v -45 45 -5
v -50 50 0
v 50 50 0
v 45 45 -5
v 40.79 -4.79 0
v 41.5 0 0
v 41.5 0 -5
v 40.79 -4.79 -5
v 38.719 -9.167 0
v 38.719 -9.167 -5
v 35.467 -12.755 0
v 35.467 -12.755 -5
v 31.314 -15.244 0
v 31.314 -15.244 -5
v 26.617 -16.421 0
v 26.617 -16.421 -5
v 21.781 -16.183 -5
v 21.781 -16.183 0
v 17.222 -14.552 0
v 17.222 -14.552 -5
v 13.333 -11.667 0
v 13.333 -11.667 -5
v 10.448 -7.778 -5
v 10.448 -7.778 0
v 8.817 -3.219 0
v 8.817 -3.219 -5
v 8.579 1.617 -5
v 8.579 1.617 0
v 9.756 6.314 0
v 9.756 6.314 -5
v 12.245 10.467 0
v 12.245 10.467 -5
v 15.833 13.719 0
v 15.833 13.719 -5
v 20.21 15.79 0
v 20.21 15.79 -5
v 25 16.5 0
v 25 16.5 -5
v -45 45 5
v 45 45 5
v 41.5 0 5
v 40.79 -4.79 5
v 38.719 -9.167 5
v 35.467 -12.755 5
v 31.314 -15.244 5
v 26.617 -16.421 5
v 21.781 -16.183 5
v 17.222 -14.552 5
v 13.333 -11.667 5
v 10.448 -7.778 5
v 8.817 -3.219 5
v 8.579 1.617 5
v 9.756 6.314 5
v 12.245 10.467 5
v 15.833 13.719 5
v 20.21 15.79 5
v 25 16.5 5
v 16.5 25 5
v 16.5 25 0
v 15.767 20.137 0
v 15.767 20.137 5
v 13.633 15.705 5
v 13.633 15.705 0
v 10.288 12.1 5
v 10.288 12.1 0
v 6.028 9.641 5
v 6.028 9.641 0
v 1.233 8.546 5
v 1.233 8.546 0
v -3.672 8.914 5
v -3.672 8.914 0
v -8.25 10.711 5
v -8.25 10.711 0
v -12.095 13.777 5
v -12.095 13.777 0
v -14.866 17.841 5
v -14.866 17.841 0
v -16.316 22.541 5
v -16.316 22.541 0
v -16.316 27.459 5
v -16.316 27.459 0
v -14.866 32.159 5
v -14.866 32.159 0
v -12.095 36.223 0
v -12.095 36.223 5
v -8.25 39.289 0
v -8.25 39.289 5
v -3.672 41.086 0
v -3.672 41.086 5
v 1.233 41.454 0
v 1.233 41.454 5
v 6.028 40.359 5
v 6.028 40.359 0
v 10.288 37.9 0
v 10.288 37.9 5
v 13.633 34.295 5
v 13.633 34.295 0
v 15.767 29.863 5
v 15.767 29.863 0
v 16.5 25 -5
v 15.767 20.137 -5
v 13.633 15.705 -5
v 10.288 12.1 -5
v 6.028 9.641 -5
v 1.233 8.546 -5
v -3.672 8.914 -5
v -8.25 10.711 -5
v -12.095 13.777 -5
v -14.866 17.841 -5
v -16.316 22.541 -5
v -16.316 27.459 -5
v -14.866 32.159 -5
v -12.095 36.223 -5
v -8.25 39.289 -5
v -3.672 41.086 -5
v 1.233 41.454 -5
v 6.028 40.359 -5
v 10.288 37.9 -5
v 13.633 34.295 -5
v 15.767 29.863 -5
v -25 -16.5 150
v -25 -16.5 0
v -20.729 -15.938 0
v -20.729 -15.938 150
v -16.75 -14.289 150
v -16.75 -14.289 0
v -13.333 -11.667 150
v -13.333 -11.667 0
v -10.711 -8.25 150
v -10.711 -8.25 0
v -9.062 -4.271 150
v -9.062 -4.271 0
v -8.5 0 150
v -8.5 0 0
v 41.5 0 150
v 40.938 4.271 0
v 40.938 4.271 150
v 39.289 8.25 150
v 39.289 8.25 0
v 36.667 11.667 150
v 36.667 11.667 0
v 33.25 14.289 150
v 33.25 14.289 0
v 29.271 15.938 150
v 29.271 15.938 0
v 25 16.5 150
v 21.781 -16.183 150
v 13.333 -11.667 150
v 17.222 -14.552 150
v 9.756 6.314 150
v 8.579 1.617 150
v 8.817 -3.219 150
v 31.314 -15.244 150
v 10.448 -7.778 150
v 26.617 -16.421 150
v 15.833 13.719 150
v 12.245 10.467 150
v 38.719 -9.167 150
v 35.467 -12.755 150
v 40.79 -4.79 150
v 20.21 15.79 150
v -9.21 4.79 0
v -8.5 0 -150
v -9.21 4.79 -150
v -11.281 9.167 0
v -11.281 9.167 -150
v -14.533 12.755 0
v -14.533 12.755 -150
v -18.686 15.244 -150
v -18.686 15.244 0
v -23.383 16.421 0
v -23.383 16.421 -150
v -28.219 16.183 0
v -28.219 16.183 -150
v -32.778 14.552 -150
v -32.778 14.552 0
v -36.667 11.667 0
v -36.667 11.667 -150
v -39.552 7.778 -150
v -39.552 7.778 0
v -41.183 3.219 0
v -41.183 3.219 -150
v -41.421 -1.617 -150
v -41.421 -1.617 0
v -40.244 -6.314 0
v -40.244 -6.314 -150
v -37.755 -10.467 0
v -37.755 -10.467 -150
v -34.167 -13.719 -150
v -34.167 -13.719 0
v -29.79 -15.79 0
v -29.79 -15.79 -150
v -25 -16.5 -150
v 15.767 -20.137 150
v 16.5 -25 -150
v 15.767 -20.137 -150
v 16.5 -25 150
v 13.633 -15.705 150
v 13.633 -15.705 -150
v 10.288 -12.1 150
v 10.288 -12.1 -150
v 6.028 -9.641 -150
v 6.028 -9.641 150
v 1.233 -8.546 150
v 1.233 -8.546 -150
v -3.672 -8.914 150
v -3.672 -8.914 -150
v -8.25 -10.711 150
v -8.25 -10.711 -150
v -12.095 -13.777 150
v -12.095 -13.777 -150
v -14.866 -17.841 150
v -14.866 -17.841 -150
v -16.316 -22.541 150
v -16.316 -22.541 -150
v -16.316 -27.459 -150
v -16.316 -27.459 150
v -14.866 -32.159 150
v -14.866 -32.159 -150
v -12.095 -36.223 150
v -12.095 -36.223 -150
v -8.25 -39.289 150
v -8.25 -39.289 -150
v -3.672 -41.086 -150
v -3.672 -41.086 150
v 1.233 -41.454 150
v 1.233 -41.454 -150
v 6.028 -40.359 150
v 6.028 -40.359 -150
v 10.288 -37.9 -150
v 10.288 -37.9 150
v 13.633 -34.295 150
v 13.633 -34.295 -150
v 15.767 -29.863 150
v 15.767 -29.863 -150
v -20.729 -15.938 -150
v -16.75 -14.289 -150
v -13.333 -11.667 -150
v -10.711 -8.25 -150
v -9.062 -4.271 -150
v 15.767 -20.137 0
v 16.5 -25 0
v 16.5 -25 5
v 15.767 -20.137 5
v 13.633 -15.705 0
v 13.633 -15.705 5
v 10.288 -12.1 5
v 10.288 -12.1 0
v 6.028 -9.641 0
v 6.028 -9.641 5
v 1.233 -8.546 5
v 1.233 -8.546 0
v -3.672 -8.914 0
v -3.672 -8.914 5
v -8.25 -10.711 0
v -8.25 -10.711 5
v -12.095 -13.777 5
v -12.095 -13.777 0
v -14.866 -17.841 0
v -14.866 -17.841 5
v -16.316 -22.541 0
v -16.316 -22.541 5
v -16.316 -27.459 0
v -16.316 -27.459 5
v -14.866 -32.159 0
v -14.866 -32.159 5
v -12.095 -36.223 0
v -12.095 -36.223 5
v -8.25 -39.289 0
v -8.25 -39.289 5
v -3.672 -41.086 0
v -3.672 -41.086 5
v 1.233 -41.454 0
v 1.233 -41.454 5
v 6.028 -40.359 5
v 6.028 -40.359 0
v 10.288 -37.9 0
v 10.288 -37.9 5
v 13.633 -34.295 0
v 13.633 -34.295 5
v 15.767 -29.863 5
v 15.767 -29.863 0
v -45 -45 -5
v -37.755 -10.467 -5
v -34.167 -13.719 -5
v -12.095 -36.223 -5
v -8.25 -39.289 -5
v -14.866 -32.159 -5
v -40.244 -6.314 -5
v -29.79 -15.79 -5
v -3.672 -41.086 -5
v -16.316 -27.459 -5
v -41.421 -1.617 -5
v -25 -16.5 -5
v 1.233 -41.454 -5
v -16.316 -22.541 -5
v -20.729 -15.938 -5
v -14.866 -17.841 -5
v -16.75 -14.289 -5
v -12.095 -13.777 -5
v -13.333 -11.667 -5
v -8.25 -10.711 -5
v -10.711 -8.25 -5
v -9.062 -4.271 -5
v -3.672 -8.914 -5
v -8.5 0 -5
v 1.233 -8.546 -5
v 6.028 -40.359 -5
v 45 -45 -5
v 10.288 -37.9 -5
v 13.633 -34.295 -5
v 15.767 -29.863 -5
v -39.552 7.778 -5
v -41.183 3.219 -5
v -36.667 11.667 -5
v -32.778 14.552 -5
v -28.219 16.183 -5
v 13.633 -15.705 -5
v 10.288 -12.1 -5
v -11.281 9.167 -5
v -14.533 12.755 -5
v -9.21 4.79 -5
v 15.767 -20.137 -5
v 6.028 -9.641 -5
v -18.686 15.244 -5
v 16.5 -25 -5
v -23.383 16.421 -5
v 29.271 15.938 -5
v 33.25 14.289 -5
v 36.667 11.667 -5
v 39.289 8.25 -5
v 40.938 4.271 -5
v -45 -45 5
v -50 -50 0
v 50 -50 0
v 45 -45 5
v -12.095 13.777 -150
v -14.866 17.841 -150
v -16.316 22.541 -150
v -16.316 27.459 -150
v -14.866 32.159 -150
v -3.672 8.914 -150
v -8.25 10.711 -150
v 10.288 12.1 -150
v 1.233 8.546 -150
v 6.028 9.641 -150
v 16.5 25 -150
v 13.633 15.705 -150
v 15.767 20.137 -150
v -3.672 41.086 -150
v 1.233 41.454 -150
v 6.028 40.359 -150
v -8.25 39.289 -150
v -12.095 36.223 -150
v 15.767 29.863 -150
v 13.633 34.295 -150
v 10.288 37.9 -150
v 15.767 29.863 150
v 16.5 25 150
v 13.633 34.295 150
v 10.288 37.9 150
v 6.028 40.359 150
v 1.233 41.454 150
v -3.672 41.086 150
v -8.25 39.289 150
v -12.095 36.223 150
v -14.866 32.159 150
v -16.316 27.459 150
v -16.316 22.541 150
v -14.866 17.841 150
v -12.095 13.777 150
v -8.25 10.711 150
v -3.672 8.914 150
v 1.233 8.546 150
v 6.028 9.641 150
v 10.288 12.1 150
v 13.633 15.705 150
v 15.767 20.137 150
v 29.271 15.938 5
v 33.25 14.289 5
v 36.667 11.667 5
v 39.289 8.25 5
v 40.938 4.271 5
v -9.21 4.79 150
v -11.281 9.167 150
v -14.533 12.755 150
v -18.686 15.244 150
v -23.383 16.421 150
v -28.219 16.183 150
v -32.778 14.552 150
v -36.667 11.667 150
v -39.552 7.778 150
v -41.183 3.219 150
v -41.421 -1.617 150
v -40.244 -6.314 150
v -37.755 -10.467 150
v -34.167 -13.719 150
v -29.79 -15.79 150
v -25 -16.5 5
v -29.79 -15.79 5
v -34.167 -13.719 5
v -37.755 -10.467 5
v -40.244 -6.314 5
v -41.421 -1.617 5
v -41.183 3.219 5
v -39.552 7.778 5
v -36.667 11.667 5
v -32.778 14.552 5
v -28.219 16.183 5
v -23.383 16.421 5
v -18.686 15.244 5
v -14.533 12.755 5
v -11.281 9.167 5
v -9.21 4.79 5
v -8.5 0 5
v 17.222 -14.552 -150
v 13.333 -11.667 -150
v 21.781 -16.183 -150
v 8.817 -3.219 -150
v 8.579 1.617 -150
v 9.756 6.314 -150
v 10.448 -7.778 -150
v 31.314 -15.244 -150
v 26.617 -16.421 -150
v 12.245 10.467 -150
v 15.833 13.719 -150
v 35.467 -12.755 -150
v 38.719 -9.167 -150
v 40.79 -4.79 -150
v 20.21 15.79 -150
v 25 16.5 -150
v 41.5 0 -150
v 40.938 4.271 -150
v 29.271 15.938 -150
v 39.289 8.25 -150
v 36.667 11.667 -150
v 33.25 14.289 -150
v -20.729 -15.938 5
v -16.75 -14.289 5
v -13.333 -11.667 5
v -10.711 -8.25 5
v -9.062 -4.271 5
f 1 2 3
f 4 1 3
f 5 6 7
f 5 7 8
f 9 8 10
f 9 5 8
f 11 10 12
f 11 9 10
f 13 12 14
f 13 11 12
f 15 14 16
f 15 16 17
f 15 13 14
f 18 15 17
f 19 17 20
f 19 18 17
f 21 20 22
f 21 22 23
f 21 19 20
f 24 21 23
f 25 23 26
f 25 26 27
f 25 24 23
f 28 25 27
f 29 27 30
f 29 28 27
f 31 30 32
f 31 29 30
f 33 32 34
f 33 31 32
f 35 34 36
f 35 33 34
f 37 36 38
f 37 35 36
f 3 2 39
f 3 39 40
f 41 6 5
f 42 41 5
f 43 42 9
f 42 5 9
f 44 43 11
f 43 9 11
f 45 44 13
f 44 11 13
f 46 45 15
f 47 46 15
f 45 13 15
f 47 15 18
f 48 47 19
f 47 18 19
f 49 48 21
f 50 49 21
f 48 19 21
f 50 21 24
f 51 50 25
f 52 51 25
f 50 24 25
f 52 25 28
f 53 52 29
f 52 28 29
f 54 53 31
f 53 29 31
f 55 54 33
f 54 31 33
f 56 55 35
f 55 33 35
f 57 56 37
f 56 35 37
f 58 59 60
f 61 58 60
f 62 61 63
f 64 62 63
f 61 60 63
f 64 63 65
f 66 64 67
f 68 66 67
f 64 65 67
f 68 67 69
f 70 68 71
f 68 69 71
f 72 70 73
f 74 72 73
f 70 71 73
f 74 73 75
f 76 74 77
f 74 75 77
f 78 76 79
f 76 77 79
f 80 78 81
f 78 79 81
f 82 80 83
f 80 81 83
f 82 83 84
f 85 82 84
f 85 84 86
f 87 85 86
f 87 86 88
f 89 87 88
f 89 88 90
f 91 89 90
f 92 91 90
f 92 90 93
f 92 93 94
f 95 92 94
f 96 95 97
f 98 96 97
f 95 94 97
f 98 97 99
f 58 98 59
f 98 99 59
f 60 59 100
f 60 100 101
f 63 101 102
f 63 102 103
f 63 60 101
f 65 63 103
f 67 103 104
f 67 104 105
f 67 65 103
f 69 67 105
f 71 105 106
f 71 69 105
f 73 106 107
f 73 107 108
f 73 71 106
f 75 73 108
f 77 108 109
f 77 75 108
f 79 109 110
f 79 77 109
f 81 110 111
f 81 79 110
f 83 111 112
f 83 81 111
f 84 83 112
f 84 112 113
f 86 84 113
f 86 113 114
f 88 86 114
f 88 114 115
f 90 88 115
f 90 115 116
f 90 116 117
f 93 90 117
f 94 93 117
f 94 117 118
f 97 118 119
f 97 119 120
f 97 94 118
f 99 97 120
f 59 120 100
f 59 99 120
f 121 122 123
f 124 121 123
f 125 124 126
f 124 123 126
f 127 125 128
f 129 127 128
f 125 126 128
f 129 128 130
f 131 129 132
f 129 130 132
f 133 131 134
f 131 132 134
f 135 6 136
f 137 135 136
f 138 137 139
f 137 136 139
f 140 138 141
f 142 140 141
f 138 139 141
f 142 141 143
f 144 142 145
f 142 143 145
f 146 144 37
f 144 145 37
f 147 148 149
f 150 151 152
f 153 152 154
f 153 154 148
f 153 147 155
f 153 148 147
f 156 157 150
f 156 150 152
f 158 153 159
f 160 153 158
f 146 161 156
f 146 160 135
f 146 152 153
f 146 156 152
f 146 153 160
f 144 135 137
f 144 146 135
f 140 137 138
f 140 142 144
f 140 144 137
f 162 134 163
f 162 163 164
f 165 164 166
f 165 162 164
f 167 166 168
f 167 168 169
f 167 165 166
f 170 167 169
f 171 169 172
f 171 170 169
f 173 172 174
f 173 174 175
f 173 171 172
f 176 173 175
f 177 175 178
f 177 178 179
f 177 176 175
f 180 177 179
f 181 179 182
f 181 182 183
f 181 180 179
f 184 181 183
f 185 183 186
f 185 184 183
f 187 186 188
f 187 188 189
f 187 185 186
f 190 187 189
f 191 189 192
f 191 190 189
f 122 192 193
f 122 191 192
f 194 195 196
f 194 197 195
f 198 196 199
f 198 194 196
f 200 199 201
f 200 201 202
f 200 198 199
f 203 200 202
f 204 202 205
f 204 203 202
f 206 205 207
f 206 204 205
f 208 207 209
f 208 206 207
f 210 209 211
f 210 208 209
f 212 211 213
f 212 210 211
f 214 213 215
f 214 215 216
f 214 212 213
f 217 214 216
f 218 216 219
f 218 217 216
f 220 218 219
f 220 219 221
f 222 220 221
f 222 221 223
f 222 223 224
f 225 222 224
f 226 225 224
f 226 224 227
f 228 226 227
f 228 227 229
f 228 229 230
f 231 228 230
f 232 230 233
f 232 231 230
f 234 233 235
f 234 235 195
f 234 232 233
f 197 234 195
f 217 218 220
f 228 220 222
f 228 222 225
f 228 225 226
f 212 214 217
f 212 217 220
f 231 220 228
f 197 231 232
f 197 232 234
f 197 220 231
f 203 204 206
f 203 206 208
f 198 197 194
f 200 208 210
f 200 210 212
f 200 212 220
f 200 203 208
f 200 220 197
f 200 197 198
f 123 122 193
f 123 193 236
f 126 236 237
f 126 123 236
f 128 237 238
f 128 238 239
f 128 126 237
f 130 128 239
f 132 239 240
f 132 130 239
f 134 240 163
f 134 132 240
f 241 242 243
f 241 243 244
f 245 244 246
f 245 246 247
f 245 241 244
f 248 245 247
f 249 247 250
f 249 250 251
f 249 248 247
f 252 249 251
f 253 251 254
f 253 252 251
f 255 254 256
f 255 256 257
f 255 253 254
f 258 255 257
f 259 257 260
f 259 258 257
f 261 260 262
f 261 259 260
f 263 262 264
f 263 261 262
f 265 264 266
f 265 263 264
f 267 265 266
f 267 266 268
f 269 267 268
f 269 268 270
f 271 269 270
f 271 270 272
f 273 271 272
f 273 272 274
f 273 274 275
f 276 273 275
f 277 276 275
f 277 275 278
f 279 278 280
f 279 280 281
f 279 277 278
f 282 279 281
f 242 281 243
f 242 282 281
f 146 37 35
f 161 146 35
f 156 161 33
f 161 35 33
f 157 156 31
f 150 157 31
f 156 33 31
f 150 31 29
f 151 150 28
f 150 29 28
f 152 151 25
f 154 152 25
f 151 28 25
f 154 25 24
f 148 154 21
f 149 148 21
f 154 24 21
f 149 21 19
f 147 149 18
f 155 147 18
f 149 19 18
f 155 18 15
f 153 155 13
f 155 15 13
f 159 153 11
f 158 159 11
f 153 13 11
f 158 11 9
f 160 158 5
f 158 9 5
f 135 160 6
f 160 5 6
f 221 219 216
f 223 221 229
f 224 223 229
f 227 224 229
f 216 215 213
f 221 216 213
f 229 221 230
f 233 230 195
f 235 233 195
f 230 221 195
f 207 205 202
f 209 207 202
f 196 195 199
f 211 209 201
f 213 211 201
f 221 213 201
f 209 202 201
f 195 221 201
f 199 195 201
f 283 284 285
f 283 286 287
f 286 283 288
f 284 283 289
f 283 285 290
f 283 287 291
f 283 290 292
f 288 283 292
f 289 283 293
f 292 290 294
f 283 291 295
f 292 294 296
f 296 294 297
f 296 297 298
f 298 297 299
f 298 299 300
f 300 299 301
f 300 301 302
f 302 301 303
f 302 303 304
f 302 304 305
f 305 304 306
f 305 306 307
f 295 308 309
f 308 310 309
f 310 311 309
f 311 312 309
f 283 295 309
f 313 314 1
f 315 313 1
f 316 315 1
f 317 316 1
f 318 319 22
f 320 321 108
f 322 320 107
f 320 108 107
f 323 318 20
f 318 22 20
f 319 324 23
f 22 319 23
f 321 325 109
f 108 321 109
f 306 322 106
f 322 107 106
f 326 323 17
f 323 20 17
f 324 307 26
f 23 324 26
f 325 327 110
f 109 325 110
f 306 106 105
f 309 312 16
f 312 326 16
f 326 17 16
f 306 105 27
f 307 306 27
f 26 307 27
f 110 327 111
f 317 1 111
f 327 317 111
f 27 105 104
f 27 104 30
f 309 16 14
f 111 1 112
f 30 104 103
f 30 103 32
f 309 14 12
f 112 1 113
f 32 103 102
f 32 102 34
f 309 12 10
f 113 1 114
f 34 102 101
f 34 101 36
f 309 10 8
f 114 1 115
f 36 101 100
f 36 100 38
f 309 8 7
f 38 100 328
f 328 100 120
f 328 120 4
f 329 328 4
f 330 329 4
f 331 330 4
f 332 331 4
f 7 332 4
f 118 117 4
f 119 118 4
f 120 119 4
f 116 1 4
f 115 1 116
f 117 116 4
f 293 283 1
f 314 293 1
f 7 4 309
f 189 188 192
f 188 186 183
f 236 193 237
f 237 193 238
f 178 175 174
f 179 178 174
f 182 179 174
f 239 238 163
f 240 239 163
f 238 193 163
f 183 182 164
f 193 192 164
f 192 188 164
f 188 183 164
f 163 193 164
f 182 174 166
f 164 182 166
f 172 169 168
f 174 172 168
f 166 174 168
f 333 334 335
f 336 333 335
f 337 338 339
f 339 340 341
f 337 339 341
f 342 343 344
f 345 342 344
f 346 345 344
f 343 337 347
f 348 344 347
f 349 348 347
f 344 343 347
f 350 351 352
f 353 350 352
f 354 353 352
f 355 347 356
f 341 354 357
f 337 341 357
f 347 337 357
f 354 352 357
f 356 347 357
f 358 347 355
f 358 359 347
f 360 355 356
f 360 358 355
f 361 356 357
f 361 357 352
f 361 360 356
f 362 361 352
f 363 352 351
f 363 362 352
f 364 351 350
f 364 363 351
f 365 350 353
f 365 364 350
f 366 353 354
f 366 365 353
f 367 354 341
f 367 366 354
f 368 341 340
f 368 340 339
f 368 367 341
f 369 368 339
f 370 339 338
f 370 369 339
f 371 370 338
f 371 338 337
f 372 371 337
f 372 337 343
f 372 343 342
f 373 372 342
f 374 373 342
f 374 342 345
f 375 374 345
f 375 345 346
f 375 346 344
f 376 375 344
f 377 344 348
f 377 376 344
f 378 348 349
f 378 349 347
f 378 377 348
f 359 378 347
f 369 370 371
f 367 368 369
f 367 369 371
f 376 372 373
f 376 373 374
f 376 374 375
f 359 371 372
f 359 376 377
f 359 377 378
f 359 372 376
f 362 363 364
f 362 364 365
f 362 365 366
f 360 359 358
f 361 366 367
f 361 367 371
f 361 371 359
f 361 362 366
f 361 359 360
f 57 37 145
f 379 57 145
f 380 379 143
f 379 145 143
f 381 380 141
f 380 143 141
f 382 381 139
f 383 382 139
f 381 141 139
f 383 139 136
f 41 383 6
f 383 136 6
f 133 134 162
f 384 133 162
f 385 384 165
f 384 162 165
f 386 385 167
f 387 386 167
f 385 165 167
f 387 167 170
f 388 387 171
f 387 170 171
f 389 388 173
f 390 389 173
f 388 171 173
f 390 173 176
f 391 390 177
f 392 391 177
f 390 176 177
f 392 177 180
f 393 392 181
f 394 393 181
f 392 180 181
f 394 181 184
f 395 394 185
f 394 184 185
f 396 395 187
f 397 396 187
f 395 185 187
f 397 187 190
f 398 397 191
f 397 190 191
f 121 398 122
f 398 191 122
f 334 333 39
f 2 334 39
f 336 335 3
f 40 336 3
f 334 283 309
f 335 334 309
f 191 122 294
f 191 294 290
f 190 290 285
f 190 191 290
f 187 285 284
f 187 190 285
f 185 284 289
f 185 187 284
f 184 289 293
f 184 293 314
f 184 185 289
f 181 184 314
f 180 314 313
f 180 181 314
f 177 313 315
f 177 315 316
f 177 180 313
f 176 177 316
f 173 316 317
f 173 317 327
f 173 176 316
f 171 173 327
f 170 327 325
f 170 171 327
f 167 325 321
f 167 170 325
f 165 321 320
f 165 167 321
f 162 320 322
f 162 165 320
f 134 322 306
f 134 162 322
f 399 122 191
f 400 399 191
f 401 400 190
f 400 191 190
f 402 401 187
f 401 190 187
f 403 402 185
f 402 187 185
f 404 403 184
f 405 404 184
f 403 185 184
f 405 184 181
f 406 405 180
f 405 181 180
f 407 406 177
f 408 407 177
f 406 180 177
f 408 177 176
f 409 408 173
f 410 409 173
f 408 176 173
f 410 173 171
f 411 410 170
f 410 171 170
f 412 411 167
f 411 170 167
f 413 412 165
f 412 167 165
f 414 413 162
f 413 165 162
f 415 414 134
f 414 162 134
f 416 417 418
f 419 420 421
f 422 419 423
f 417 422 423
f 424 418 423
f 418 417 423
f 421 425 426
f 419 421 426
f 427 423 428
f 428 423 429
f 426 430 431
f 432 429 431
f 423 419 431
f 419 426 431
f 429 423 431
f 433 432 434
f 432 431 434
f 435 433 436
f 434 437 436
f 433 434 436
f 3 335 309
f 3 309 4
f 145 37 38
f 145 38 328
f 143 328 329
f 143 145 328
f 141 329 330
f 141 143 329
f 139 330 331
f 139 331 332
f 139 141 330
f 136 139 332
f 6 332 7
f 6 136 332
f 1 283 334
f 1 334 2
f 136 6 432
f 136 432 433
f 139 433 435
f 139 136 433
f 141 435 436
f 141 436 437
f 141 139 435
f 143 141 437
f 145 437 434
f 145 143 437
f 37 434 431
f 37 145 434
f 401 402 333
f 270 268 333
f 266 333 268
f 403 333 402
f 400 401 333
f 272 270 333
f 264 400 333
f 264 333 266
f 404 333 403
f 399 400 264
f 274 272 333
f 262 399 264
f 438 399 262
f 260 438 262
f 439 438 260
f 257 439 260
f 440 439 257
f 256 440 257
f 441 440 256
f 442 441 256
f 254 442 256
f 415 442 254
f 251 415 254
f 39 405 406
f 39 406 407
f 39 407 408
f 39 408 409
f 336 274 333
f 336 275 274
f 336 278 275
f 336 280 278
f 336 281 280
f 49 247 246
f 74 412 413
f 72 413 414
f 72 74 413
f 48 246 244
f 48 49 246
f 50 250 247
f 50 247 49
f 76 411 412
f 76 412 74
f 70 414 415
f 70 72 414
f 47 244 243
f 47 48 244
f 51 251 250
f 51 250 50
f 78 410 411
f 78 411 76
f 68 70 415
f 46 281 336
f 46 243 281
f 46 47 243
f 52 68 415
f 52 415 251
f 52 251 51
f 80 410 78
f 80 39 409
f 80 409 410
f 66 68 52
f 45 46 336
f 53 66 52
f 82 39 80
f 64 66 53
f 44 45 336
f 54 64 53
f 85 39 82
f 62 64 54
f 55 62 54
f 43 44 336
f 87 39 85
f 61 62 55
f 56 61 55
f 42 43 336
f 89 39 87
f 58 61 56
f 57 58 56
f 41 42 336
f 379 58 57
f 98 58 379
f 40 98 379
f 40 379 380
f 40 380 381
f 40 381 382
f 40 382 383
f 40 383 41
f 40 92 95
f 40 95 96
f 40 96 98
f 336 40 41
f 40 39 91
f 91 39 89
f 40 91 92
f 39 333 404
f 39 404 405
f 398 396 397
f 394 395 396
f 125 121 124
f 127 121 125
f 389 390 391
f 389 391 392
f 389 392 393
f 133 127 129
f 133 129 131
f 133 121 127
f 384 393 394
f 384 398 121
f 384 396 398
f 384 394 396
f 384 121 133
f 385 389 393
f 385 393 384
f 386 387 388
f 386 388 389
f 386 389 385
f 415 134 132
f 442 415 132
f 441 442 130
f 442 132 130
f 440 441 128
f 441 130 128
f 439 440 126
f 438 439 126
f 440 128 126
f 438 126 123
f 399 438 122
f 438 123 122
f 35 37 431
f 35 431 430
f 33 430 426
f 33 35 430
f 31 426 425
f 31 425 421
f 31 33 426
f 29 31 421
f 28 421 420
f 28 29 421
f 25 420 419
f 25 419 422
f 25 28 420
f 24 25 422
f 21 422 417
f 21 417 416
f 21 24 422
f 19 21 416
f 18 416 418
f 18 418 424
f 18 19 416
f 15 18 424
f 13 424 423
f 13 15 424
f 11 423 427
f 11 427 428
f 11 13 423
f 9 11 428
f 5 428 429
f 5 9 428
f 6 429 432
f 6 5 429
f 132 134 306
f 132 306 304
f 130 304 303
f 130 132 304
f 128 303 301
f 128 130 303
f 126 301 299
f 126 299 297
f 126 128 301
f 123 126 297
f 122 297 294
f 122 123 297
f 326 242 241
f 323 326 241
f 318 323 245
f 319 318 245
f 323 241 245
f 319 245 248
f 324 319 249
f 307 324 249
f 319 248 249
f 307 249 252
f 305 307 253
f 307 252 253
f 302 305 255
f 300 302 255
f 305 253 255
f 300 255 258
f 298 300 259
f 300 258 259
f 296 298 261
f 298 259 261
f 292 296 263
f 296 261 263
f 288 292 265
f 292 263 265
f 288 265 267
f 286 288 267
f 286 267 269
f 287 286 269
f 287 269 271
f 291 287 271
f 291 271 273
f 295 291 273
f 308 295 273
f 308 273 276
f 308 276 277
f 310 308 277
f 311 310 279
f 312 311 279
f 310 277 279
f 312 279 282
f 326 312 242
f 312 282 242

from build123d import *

# Parameters (mm, degrees)
F1_DEPTH = 150
F0_R     = 16.5
F0_W     = 100
F0_H     = 100
F2_DEPTH = 5
F3_SIZE  = 5
F4_SIZE  = 4.99999


# Not quite as in the source:
# - a fillet or chamfer is up to 0.001 mm smaller than in the source, because OpenCascade refuses the exact size


with BuildPart() as f1:
    # F0 (on Top) → F1 (new body, symmetric)
    with BuildSketch(Plane.XY):
        with BuildLine():
            ThreePointArc((-16.5, 25), (0, 8.5), (16.5, 25))
            ThreePointArc((16.5, 25), (0, 41.5), (-16.5, 25))
        make_face()
    extrude(amount=F1_DEPTH, both=True)


with BuildPart() as f1b:
    # F0 (on Top) → F1, piece 2 (new body, symmetric)
    with BuildSketch(Plane.XY):
        with BuildLine():
            ThreePointArc((-25, -16.5), (-13.3327381104, -11.6672618896), (-8.5, 0))
            ThreePointArc((-8.5, 0), (-36.6672618896, 11.6672618896), (-25, -16.5))
        make_face()
    extrude(amount=F1_DEPTH, both=True)


with BuildPart() as f1c:
    # F0 (on Top) → F1, piece 3 (new body, symmetric)
    with BuildSketch(Plane.XY):
        with BuildLine():
            ThreePointArc((25, 16.5), (13.3327381104, -11.6672618896), (41.5, 0))
            ThreePointArc((41.5, 0), (36.6672618896, 11.6672618896), (25, 16.5))
        make_face()
    extrude(amount=F1_DEPTH, both=True)


with BuildPart() as f1d:
    # F0 (on Top) → F1, piece 4 (new body, symmetric)
    with BuildSketch(Plane.XY):
        with Locations((0, -25)):
            Circle(F0_R)
    extrude(amount=F1_DEPTH, both=True)


with BuildPart() as f2:
    # F0 (on Top) → F2 (new body, symmetric)
    with BuildSketch(Plane.XY):
        Rectangle(F0_W, F0_H)
        with Locations((0, -25)):
            Circle(F0_R, mode=Mode.SUBTRACT)
        with BuildLine():
            ThreePointArc((-25, -16.5), (-36.6672618896, 11.6672618896), (-8.5, 0))
            ThreePointArc((-8.5, 0), (-13.3327381104, -11.6672618896), (-25, -16.5))
        make_face(mode=Mode.SUBTRACT)
        with BuildLine():
            ThreePointArc((25, 16.5), (36.6672618896, 11.6672618896), (41.5, 0))
            ThreePointArc((41.5, 0), (13.3327381104, -11.6672618896), (25, 16.5))
        make_face(mode=Mode.SUBTRACT)
        with BuildLine():
            ThreePointArc((-16.5, 25), (0, 41.5), (16.5, 25))
            ThreePointArc((16.5, 25), (0, 8.5), (-16.5, 25))
        make_face(mode=Mode.SUBTRACT)
    extrude(amount=F2_DEPTH, both=True)

    # F3
    f3_edges = [f2.edges().sort_by_distance(p)[0] for p in [
        (0, -50, 5),
        (50, 0, 5),
        (-50, 0, 5),
        (0, 50, 5),
    ]]
    chamfer(f3_edges, length=F3_SIZE)

    # F4 (size 5 in the source; OpenCascade refuses exactly that, so slightly less here)
    f4_edges = [f2.edges().sort_by_distance(p)[0] for p in [
        (0, 50, -5),
        (50, 0, -5),
        (0, -50, -5),
        (-50, 0, -5),
    ]]
    chamfer(f4_edges, length=F4_SIZE)


solid = Compound([f1.part, f1b.part, f1c.part, f1d.part, f2.part])
